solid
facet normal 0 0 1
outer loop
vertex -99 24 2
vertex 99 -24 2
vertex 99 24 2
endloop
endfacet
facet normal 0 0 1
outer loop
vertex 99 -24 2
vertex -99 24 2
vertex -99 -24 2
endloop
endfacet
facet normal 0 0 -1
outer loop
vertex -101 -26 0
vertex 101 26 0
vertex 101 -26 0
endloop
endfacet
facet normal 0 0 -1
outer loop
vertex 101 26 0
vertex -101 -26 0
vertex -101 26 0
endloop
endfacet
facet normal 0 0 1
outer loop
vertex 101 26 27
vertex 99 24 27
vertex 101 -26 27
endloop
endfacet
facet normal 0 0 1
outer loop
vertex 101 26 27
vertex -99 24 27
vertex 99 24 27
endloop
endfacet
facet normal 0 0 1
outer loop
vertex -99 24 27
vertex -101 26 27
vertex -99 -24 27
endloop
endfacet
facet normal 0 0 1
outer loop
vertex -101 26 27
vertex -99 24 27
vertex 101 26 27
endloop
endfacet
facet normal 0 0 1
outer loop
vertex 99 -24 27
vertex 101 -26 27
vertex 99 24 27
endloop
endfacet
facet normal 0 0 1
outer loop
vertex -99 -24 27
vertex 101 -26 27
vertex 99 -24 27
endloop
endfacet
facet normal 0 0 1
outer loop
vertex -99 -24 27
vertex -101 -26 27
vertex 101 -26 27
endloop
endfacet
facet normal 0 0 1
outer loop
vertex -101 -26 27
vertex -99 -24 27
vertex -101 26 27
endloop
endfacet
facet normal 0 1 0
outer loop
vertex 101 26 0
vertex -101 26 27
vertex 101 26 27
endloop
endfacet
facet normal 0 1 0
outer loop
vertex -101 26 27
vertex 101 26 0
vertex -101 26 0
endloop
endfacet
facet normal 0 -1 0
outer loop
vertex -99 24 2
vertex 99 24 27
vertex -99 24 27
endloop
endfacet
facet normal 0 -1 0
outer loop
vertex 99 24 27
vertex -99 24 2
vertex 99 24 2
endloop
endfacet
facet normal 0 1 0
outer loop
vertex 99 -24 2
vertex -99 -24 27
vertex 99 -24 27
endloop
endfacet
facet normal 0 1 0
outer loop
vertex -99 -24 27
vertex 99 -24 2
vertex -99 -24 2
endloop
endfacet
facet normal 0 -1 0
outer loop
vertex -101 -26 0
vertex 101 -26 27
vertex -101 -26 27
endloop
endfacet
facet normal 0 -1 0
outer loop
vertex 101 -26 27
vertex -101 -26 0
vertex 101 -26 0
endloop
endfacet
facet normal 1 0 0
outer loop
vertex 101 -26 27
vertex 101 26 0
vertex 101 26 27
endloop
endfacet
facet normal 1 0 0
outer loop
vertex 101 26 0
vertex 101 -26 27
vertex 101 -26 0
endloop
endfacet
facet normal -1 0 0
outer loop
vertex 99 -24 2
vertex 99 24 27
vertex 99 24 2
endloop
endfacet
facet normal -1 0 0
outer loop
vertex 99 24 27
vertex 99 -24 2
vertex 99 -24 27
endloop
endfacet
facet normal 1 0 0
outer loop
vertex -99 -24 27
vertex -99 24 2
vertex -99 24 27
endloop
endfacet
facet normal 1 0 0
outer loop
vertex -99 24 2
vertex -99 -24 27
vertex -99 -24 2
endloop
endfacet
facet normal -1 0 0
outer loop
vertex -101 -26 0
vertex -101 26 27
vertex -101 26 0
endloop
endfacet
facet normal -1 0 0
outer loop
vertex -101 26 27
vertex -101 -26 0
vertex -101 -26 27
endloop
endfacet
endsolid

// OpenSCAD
$fa = 1;
$fs = 0.4;

base_length = 200;
base_width = 50;
base_depth = 25;

wall_thick = 2;


// bottom
translate([0, 0, wall_thick/2])
cube([base_length, base_width, wall_thick], center=true);

// short sides
translate([0, base_width / 2, (base_depth + wall_thick) / 2])
cube([base_length, wall_thick, base_depth + wall_thick], center=true);

translate([0, -base_width / 2, (base_depth + wall_thick) / 2])
cube([base_length, wall_thick, base_depth + wall_thick], center=true);

// short sides
translate([base_length / 2, 0, (base_depth + wall_thick) / 2])
cube([wall_thick, base_width + wall_thick, base_depth + wall_thick], center=true);

translate([-base_length / 2, 0, (base_depth + wall_thick) / 2])
cube([wall_thick, base_width + wall_thick, base_depth + wall_thick], center=true);
